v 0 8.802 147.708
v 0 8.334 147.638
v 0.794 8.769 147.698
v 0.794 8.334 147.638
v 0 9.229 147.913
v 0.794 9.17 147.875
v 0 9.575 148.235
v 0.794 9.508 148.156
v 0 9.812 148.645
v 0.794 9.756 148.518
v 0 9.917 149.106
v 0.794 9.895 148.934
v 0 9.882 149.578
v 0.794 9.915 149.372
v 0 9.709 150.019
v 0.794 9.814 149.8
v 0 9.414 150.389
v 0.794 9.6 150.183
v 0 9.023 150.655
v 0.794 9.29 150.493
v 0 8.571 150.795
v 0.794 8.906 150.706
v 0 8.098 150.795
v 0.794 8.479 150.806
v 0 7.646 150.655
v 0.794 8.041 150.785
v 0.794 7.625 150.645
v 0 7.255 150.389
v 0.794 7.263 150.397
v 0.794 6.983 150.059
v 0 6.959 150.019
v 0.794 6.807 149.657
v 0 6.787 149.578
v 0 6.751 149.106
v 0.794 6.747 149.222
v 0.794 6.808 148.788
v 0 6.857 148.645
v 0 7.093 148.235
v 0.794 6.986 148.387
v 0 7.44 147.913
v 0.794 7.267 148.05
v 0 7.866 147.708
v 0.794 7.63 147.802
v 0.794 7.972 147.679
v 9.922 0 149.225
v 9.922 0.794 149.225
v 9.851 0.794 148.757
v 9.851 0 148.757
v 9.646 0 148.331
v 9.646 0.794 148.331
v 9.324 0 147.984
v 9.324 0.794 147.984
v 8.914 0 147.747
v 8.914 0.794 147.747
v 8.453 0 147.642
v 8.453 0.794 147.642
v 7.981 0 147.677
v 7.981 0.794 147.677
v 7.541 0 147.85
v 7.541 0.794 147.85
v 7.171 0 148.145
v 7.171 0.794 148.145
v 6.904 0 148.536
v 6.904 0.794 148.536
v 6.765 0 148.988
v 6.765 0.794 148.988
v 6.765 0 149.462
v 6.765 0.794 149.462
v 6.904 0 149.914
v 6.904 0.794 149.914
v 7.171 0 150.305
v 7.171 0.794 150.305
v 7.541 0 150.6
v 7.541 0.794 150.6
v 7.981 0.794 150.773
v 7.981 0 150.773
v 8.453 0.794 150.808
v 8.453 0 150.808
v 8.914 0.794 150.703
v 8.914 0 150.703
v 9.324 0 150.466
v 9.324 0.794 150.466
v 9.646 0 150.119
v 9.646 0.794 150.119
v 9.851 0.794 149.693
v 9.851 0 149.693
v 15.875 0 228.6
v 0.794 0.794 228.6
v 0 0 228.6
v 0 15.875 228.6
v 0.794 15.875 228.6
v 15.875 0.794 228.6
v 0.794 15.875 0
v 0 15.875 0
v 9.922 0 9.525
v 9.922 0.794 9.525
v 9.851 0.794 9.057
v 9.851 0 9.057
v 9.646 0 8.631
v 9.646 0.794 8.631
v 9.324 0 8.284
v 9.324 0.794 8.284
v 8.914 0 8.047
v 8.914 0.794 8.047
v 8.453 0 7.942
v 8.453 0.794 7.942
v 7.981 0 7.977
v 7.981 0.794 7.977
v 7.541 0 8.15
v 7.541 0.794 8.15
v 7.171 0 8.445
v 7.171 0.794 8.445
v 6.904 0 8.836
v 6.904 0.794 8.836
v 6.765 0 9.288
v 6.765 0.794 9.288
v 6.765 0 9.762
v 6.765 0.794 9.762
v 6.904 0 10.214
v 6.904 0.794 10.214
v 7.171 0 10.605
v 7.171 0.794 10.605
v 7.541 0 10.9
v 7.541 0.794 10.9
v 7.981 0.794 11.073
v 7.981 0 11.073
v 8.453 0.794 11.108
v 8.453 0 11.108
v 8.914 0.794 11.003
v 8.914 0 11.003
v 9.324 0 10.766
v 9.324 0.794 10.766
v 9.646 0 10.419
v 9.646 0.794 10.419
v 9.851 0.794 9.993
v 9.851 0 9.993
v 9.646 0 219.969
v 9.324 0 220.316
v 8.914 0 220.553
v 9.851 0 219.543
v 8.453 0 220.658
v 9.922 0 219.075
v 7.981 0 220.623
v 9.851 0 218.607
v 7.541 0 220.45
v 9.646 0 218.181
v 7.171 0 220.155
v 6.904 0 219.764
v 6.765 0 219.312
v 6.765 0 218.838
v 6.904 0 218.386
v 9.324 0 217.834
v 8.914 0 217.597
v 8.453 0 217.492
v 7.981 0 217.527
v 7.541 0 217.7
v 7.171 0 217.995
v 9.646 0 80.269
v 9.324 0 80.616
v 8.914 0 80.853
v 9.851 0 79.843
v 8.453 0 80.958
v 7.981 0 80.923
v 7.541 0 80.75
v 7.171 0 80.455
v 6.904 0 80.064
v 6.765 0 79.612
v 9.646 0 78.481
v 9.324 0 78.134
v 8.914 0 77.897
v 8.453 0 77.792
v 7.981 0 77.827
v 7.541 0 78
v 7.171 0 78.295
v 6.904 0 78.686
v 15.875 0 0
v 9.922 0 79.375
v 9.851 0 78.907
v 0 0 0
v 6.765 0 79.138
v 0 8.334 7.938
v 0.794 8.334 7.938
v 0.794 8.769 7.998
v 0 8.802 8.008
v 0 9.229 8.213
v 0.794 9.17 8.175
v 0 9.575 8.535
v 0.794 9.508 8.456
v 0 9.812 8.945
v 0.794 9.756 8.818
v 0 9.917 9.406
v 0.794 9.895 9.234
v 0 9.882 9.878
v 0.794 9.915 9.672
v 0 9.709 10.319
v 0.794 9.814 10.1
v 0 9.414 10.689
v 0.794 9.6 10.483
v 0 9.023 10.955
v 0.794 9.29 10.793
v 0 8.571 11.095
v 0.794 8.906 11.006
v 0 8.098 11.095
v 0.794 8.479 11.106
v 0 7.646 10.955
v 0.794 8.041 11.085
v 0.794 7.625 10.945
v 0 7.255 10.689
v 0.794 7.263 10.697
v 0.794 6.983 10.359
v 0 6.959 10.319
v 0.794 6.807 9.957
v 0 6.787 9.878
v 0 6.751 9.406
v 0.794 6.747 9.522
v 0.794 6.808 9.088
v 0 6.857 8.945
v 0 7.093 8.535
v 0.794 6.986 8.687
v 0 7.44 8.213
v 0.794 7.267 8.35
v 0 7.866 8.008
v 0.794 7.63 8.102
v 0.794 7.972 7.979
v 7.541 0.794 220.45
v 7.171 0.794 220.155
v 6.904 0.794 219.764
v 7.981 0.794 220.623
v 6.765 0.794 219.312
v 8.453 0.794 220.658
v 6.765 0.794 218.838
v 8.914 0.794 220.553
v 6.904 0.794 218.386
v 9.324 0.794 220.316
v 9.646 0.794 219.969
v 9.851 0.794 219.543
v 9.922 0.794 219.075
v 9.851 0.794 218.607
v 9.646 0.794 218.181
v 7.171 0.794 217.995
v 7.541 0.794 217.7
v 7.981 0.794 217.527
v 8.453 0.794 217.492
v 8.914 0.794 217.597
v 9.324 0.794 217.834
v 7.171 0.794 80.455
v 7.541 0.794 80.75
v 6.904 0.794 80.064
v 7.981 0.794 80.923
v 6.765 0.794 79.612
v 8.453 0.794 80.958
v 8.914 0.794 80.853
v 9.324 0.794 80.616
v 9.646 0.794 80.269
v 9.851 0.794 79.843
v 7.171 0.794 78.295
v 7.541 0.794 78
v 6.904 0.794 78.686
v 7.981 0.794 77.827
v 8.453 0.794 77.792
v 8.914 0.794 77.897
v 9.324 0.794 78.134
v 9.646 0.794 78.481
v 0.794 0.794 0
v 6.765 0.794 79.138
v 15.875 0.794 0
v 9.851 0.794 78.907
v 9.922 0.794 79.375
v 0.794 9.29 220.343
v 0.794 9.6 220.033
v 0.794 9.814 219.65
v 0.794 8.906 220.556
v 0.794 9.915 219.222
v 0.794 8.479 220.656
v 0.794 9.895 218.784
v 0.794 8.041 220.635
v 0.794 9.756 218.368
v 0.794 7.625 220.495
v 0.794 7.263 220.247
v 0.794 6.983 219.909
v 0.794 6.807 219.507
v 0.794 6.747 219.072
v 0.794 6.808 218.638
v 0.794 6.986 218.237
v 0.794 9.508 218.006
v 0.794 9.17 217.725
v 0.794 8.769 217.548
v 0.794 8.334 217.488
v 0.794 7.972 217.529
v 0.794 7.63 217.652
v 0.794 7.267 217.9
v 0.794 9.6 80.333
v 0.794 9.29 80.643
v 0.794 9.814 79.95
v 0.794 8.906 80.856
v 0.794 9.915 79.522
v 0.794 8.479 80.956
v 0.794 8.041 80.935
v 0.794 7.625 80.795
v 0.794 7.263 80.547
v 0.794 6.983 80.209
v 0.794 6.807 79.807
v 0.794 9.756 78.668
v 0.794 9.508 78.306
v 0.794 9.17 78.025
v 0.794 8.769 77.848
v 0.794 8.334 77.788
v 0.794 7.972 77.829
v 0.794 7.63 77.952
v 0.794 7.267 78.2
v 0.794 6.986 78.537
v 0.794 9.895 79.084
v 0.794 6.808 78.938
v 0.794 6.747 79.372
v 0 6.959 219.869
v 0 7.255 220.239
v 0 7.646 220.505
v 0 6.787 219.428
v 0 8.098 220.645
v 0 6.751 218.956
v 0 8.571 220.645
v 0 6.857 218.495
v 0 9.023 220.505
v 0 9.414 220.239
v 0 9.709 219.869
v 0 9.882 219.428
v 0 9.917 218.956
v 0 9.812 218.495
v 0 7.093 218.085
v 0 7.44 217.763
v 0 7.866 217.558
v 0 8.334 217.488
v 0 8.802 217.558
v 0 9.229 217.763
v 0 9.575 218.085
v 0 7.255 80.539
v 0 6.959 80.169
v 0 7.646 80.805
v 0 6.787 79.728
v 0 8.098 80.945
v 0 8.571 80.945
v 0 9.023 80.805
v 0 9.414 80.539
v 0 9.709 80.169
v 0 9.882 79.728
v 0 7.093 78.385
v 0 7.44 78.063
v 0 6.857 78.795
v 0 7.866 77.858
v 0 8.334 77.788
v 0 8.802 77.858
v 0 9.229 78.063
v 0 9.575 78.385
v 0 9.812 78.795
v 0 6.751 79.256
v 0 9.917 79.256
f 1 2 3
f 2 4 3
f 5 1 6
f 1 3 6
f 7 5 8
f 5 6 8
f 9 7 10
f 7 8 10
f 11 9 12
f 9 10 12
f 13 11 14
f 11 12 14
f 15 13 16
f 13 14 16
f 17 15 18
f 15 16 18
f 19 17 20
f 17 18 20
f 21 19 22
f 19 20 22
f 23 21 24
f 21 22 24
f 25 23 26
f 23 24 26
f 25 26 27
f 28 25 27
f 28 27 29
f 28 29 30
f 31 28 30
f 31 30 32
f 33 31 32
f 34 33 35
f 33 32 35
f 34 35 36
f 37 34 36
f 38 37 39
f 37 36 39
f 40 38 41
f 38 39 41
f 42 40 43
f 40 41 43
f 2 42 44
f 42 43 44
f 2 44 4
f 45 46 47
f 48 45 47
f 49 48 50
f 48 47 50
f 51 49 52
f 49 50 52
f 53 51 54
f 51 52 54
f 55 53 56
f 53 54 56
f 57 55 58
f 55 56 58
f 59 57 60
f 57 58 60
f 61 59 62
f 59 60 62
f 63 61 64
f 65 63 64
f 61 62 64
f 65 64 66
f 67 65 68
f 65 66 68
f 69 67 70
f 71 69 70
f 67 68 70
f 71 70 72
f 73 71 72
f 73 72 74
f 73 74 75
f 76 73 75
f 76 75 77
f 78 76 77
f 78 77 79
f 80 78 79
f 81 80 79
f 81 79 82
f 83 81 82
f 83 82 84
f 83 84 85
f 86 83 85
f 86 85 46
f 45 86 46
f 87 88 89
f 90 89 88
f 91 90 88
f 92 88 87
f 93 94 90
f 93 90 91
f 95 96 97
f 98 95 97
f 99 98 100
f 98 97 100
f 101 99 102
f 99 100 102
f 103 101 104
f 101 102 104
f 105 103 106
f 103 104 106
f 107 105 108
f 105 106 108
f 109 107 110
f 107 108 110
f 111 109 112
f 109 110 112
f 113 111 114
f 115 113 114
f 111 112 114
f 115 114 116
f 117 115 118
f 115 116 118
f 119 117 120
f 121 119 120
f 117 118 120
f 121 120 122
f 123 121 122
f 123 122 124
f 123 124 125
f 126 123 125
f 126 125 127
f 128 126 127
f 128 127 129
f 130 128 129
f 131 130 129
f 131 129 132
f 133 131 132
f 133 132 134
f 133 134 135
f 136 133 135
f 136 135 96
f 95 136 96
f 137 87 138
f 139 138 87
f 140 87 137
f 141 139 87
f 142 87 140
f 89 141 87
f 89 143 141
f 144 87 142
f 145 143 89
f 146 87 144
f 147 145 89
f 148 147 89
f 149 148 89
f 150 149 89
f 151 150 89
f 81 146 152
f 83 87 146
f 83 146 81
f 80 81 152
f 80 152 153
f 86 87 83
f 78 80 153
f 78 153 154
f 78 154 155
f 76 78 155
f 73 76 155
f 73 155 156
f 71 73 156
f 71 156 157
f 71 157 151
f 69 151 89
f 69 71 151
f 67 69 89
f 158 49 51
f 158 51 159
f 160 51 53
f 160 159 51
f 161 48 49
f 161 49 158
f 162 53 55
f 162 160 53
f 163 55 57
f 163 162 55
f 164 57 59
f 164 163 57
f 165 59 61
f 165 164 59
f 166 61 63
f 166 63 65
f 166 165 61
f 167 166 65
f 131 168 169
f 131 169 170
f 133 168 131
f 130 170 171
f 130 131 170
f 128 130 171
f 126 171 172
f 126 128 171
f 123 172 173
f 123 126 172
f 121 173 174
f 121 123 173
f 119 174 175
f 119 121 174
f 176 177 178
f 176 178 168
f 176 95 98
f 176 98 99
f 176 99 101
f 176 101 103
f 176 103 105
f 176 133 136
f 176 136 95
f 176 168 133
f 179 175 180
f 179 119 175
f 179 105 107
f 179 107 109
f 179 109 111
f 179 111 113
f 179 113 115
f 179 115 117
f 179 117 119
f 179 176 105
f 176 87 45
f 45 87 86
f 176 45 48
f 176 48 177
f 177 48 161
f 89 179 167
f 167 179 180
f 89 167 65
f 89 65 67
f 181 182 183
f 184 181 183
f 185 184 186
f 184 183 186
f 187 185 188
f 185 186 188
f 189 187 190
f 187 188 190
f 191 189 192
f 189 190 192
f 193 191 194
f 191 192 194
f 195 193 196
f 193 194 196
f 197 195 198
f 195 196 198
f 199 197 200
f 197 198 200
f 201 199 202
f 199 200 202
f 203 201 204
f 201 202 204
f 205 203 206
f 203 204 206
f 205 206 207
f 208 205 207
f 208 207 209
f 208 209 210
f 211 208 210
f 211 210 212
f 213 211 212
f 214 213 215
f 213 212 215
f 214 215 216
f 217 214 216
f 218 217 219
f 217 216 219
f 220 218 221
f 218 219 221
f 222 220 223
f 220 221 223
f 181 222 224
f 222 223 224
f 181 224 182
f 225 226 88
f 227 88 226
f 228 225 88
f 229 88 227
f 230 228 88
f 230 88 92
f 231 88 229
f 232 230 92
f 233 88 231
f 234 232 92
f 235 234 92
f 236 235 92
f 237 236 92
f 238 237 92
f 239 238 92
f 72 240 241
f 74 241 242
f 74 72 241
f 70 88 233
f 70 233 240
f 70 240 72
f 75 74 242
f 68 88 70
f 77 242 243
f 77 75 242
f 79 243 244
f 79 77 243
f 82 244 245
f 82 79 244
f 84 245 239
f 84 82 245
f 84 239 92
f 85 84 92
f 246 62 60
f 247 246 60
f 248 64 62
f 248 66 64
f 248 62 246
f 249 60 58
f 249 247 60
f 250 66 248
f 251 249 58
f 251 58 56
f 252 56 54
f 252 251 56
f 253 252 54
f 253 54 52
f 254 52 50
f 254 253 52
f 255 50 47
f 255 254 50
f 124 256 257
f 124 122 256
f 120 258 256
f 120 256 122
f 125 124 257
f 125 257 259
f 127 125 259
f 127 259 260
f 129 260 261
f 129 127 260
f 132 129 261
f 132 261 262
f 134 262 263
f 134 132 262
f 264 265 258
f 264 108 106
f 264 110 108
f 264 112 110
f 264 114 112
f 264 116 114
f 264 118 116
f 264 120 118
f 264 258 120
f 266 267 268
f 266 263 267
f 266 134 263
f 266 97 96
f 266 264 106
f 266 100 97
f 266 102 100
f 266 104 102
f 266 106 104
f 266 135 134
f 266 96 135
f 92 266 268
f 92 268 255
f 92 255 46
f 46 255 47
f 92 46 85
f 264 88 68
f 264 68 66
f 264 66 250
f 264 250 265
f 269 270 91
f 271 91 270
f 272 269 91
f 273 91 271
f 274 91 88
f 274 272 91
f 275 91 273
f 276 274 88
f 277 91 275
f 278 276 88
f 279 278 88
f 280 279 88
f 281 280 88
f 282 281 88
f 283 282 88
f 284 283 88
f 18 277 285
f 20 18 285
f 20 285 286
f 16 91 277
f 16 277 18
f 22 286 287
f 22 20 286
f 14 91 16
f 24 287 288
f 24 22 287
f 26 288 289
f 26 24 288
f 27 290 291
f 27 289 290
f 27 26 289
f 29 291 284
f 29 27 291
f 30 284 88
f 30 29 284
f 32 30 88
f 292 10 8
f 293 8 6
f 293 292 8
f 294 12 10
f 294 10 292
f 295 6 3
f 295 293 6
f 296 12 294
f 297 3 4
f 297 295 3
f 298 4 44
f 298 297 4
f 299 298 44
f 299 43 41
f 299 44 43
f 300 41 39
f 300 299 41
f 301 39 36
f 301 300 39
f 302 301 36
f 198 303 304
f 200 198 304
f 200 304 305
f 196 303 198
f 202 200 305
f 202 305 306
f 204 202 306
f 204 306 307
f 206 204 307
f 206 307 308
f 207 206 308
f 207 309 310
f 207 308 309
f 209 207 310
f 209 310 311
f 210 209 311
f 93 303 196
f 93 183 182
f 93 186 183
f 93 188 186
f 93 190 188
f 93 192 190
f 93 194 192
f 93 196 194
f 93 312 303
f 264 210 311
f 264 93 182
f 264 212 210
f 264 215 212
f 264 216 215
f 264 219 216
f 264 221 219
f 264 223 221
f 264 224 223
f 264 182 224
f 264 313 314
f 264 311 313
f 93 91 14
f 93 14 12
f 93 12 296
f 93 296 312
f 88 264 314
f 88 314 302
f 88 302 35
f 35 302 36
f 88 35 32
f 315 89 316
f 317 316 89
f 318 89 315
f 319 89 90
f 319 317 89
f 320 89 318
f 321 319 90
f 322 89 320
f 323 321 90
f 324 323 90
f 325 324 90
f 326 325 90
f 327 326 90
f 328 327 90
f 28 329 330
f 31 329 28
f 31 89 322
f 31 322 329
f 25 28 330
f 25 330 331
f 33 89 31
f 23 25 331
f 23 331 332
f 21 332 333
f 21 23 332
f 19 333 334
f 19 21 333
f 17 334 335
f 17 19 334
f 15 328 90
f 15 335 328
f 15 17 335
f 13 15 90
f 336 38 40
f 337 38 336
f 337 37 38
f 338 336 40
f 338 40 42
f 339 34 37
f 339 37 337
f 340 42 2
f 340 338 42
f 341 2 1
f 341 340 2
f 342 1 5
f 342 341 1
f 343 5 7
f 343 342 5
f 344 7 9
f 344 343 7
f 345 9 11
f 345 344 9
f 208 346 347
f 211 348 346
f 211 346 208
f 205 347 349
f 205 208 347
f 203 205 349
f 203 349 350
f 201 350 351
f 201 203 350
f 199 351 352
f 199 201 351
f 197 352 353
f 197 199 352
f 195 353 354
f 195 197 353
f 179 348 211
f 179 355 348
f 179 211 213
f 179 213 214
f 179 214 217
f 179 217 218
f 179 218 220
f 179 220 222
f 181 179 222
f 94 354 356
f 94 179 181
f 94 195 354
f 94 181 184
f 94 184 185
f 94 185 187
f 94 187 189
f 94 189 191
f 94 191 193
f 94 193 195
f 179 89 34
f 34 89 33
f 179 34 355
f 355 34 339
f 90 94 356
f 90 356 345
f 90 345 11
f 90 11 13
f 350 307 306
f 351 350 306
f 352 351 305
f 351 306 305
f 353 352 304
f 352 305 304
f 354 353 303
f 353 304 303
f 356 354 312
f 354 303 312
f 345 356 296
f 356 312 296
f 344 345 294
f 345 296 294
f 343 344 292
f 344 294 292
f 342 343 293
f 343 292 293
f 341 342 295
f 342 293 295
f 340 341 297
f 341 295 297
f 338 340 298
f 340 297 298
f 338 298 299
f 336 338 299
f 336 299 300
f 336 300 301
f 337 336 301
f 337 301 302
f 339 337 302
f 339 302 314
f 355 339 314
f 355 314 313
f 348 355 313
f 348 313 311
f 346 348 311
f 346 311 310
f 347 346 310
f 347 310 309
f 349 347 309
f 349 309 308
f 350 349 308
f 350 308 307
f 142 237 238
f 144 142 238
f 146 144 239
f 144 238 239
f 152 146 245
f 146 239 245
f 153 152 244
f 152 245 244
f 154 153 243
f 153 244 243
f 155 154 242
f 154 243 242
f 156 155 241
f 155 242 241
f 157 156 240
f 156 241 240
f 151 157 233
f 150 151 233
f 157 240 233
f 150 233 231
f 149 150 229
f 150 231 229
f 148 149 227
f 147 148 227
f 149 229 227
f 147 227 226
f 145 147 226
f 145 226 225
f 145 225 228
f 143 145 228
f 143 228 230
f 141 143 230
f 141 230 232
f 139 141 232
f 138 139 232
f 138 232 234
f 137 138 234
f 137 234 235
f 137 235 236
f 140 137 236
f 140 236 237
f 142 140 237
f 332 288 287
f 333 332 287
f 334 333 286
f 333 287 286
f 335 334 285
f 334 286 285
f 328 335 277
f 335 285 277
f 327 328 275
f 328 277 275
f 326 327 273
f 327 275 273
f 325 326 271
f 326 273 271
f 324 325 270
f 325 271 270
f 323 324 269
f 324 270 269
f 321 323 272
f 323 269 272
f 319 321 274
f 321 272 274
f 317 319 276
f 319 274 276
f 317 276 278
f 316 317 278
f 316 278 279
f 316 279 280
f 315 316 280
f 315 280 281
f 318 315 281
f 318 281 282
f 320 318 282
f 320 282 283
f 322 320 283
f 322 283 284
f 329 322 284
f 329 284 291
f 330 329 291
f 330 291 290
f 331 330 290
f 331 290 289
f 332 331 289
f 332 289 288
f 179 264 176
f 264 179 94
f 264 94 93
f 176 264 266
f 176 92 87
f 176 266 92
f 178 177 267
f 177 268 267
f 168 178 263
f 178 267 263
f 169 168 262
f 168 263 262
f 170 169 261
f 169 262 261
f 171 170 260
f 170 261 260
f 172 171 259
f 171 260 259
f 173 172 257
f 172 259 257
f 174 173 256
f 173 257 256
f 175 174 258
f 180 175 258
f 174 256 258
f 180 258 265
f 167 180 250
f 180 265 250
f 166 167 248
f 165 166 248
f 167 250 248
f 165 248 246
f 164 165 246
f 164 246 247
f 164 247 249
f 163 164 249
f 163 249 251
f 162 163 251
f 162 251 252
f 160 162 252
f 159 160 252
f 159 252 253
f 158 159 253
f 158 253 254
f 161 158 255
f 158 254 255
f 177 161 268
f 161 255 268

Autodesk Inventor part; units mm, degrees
ref_plane "YZ Plane" through (0, 0, 0) normal (1, 0, 0) x (0, 1, 0)
ref_plane "XZ Plane" through (0, 0, 0) normal (0, 1, 0) x (-1, 0, 0)
ref_plane "XY Plane" through (0, 0, 0) normal (0, 0, 1) x (1, 0, 0)
sketch "Sketch1" plane through (0, 0, 0) normal (0, 0, 1) x (1, 0, 0)
  line L0 (0, 0) -> (0, 15.875)
  line L1 (0, 15.875) -> (0.7937, 15.875)
  line L2 (0.7937, 15.875) -> (0.7938, 0.7937)
  line L3 (0.7938, 0.7937) -> (15.875, 0.7937)
  line L4 (15.875, 0.7937) -> (15.875, 0)
  line L5 (15.875, 0) -> (0, 0)
  dimension "d0" = 15.875
  dimension "d1" = 0.7937
extrude "Extrusion1" add sketch "Sketch1" along normal blind 228.6
sketch "Sketch2" plane through (0.7938, 0.7937, 0) normal (0, 1, 0) x (1, 0, 0)
  line L0 (0, 0) -> (15.0812, 0) projected
  line L1 (15.0812, -228.6) -> (0, -228.6) projected
  line L2 (7.5406, 0) -> (7.5406, -228.6) construction
  circle A0 centre (7.5406, -9.525) radius 1.5875
  circle A1 centre (7.5406, -79.375) radius 1.5875
  circle A2 centre (7.5406, -149.225) radius 1.5875
  circle A3 centre (7.5406, -219.075) radius 1.5875
  point P0 (-0.7938, 0)
  dimension "d4" = 9.525
  dimension "d5" = 3.175
  dimension "d6" = 228.6
  dimension "d9" = 69.85
sketch "Sketch3" plane through (0.7938, 0.7937, 0) normal (1, 0, 0) x (0, 0, -1)
  line L0 (0, 15.0812) -> (0, 0) projected
  line L1 (-228.6, 0) -> (-228.6, 15.0812) projected
  line L2 (-228.6, 7.5406) -> (0, 7.5406) construction
  circle A0 centre (-9.525, 7.5406) radius 1.5875
  circle A1 centre (-79.375, 7.5406) radius 1.5875
  circle A2 centre (-149.225, 7.5406) radius 1.5875
  circle A3 centre (-219.075, 7.5406) radius 1.5875
  point P0 (0, -0.7937)
  dimension "d14" = 3.175
  dimension "d15" = 9.525
  dimension "d16" = 228.6
  dimension "d19" = 69.85
extrude "Extrusion2" cut sketch "Sketch2" against normal through all
extrude "Extrusion3" cut sketch "Sketch3" against normal through all
properties part number "Hopper Bracing Front Bottom P6" material "Aluminum 6061"
